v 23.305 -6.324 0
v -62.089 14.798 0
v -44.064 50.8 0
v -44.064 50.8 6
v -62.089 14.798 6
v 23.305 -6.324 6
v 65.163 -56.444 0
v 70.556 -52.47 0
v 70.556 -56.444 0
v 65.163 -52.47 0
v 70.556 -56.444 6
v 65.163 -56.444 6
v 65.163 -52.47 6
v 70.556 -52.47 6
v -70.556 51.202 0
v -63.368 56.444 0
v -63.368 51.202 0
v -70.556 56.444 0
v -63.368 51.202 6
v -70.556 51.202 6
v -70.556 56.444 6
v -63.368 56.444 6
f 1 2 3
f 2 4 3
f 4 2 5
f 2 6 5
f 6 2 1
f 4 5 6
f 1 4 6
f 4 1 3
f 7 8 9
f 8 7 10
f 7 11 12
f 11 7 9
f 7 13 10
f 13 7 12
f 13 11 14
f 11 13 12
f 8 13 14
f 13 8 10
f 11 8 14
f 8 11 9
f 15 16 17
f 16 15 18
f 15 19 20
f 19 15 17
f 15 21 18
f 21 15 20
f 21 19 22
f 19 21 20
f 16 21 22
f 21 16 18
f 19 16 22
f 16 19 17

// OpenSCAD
// Module names are of the form poly_<inkscape-path-id>().
// As a result you can associate a polygon in this OpenSCAD program with the
//  corresponding SVG element in the Inkscape document by looking for 
//  the XML element with the attribute id="inkscape-path-id".

// Paths have their own variables so they can be imported and used 
//  in polygon(points) structures in other programs.
// The NN_points is the list of all polygon XY vertices. 
// There may be an NN_paths variable as well. If it exists then it 
//  defines the nested paths. Both must be used in the 
//  polygon(points, paths) variant of the command.

profile_scale = 25.4/90; //made in inkscape in mm

// helper functions to determine the X,Y dimensions of the profiles
function min_x(shape_points) = min([ for (x = shape_points) min(x[0])]);
function max_x(shape_points) = max([ for (x = shape_points) max(x[0])]);
function min_y(shape_points) = min([ for (x = shape_points) min(x[1])]);
function max_y(shape_points) = max([ for (x = shape_points) max(x[1])]);

height = 6;
width = 1.0;


path3199_0_points = [[-156.130890,-180.000000],[-220.000007,-52.433550],[82.578363,22.409089],[-156.130890,-180.000000],[-156.130890,-180.000000]];

module poly_path3199(h, w, res=4)  {
  scale([profile_scale, -profile_scale, 1])
  union()  {
    linear_extrude(height=h)
      polygon(path3199_0_points);
  }
}

rect819_0_points = [[230.892543,185.917790],[250.000007,185.917790],[250.000007,200.000000],[230.892543,200.000000],[230.892543,185.917790]];

module poly_rect819(h, w, res=4)  {
  scale([profile_scale, -profile_scale, 1])
  union()  {
    linear_extrude(height=h)
      polygon(rect819_0_points);
  }
}

rect817_0_points = [[-250.000007,-200.000000],[-224.532178,-200.000000],[-224.532178,-181.423466],[-250.000007,-181.423466],[-250.000007,-200.000000]];

module poly_rect817(h, w, res=4)  {
  scale([profile_scale, -profile_scale, 1])
  union()  {
    linear_extrude(height=h)
      polygon(rect817_0_points);
  }
}

// The shapes
poly_path3199(height, width);
poly_rect819(height, width);
poly_rect817(height, width);
